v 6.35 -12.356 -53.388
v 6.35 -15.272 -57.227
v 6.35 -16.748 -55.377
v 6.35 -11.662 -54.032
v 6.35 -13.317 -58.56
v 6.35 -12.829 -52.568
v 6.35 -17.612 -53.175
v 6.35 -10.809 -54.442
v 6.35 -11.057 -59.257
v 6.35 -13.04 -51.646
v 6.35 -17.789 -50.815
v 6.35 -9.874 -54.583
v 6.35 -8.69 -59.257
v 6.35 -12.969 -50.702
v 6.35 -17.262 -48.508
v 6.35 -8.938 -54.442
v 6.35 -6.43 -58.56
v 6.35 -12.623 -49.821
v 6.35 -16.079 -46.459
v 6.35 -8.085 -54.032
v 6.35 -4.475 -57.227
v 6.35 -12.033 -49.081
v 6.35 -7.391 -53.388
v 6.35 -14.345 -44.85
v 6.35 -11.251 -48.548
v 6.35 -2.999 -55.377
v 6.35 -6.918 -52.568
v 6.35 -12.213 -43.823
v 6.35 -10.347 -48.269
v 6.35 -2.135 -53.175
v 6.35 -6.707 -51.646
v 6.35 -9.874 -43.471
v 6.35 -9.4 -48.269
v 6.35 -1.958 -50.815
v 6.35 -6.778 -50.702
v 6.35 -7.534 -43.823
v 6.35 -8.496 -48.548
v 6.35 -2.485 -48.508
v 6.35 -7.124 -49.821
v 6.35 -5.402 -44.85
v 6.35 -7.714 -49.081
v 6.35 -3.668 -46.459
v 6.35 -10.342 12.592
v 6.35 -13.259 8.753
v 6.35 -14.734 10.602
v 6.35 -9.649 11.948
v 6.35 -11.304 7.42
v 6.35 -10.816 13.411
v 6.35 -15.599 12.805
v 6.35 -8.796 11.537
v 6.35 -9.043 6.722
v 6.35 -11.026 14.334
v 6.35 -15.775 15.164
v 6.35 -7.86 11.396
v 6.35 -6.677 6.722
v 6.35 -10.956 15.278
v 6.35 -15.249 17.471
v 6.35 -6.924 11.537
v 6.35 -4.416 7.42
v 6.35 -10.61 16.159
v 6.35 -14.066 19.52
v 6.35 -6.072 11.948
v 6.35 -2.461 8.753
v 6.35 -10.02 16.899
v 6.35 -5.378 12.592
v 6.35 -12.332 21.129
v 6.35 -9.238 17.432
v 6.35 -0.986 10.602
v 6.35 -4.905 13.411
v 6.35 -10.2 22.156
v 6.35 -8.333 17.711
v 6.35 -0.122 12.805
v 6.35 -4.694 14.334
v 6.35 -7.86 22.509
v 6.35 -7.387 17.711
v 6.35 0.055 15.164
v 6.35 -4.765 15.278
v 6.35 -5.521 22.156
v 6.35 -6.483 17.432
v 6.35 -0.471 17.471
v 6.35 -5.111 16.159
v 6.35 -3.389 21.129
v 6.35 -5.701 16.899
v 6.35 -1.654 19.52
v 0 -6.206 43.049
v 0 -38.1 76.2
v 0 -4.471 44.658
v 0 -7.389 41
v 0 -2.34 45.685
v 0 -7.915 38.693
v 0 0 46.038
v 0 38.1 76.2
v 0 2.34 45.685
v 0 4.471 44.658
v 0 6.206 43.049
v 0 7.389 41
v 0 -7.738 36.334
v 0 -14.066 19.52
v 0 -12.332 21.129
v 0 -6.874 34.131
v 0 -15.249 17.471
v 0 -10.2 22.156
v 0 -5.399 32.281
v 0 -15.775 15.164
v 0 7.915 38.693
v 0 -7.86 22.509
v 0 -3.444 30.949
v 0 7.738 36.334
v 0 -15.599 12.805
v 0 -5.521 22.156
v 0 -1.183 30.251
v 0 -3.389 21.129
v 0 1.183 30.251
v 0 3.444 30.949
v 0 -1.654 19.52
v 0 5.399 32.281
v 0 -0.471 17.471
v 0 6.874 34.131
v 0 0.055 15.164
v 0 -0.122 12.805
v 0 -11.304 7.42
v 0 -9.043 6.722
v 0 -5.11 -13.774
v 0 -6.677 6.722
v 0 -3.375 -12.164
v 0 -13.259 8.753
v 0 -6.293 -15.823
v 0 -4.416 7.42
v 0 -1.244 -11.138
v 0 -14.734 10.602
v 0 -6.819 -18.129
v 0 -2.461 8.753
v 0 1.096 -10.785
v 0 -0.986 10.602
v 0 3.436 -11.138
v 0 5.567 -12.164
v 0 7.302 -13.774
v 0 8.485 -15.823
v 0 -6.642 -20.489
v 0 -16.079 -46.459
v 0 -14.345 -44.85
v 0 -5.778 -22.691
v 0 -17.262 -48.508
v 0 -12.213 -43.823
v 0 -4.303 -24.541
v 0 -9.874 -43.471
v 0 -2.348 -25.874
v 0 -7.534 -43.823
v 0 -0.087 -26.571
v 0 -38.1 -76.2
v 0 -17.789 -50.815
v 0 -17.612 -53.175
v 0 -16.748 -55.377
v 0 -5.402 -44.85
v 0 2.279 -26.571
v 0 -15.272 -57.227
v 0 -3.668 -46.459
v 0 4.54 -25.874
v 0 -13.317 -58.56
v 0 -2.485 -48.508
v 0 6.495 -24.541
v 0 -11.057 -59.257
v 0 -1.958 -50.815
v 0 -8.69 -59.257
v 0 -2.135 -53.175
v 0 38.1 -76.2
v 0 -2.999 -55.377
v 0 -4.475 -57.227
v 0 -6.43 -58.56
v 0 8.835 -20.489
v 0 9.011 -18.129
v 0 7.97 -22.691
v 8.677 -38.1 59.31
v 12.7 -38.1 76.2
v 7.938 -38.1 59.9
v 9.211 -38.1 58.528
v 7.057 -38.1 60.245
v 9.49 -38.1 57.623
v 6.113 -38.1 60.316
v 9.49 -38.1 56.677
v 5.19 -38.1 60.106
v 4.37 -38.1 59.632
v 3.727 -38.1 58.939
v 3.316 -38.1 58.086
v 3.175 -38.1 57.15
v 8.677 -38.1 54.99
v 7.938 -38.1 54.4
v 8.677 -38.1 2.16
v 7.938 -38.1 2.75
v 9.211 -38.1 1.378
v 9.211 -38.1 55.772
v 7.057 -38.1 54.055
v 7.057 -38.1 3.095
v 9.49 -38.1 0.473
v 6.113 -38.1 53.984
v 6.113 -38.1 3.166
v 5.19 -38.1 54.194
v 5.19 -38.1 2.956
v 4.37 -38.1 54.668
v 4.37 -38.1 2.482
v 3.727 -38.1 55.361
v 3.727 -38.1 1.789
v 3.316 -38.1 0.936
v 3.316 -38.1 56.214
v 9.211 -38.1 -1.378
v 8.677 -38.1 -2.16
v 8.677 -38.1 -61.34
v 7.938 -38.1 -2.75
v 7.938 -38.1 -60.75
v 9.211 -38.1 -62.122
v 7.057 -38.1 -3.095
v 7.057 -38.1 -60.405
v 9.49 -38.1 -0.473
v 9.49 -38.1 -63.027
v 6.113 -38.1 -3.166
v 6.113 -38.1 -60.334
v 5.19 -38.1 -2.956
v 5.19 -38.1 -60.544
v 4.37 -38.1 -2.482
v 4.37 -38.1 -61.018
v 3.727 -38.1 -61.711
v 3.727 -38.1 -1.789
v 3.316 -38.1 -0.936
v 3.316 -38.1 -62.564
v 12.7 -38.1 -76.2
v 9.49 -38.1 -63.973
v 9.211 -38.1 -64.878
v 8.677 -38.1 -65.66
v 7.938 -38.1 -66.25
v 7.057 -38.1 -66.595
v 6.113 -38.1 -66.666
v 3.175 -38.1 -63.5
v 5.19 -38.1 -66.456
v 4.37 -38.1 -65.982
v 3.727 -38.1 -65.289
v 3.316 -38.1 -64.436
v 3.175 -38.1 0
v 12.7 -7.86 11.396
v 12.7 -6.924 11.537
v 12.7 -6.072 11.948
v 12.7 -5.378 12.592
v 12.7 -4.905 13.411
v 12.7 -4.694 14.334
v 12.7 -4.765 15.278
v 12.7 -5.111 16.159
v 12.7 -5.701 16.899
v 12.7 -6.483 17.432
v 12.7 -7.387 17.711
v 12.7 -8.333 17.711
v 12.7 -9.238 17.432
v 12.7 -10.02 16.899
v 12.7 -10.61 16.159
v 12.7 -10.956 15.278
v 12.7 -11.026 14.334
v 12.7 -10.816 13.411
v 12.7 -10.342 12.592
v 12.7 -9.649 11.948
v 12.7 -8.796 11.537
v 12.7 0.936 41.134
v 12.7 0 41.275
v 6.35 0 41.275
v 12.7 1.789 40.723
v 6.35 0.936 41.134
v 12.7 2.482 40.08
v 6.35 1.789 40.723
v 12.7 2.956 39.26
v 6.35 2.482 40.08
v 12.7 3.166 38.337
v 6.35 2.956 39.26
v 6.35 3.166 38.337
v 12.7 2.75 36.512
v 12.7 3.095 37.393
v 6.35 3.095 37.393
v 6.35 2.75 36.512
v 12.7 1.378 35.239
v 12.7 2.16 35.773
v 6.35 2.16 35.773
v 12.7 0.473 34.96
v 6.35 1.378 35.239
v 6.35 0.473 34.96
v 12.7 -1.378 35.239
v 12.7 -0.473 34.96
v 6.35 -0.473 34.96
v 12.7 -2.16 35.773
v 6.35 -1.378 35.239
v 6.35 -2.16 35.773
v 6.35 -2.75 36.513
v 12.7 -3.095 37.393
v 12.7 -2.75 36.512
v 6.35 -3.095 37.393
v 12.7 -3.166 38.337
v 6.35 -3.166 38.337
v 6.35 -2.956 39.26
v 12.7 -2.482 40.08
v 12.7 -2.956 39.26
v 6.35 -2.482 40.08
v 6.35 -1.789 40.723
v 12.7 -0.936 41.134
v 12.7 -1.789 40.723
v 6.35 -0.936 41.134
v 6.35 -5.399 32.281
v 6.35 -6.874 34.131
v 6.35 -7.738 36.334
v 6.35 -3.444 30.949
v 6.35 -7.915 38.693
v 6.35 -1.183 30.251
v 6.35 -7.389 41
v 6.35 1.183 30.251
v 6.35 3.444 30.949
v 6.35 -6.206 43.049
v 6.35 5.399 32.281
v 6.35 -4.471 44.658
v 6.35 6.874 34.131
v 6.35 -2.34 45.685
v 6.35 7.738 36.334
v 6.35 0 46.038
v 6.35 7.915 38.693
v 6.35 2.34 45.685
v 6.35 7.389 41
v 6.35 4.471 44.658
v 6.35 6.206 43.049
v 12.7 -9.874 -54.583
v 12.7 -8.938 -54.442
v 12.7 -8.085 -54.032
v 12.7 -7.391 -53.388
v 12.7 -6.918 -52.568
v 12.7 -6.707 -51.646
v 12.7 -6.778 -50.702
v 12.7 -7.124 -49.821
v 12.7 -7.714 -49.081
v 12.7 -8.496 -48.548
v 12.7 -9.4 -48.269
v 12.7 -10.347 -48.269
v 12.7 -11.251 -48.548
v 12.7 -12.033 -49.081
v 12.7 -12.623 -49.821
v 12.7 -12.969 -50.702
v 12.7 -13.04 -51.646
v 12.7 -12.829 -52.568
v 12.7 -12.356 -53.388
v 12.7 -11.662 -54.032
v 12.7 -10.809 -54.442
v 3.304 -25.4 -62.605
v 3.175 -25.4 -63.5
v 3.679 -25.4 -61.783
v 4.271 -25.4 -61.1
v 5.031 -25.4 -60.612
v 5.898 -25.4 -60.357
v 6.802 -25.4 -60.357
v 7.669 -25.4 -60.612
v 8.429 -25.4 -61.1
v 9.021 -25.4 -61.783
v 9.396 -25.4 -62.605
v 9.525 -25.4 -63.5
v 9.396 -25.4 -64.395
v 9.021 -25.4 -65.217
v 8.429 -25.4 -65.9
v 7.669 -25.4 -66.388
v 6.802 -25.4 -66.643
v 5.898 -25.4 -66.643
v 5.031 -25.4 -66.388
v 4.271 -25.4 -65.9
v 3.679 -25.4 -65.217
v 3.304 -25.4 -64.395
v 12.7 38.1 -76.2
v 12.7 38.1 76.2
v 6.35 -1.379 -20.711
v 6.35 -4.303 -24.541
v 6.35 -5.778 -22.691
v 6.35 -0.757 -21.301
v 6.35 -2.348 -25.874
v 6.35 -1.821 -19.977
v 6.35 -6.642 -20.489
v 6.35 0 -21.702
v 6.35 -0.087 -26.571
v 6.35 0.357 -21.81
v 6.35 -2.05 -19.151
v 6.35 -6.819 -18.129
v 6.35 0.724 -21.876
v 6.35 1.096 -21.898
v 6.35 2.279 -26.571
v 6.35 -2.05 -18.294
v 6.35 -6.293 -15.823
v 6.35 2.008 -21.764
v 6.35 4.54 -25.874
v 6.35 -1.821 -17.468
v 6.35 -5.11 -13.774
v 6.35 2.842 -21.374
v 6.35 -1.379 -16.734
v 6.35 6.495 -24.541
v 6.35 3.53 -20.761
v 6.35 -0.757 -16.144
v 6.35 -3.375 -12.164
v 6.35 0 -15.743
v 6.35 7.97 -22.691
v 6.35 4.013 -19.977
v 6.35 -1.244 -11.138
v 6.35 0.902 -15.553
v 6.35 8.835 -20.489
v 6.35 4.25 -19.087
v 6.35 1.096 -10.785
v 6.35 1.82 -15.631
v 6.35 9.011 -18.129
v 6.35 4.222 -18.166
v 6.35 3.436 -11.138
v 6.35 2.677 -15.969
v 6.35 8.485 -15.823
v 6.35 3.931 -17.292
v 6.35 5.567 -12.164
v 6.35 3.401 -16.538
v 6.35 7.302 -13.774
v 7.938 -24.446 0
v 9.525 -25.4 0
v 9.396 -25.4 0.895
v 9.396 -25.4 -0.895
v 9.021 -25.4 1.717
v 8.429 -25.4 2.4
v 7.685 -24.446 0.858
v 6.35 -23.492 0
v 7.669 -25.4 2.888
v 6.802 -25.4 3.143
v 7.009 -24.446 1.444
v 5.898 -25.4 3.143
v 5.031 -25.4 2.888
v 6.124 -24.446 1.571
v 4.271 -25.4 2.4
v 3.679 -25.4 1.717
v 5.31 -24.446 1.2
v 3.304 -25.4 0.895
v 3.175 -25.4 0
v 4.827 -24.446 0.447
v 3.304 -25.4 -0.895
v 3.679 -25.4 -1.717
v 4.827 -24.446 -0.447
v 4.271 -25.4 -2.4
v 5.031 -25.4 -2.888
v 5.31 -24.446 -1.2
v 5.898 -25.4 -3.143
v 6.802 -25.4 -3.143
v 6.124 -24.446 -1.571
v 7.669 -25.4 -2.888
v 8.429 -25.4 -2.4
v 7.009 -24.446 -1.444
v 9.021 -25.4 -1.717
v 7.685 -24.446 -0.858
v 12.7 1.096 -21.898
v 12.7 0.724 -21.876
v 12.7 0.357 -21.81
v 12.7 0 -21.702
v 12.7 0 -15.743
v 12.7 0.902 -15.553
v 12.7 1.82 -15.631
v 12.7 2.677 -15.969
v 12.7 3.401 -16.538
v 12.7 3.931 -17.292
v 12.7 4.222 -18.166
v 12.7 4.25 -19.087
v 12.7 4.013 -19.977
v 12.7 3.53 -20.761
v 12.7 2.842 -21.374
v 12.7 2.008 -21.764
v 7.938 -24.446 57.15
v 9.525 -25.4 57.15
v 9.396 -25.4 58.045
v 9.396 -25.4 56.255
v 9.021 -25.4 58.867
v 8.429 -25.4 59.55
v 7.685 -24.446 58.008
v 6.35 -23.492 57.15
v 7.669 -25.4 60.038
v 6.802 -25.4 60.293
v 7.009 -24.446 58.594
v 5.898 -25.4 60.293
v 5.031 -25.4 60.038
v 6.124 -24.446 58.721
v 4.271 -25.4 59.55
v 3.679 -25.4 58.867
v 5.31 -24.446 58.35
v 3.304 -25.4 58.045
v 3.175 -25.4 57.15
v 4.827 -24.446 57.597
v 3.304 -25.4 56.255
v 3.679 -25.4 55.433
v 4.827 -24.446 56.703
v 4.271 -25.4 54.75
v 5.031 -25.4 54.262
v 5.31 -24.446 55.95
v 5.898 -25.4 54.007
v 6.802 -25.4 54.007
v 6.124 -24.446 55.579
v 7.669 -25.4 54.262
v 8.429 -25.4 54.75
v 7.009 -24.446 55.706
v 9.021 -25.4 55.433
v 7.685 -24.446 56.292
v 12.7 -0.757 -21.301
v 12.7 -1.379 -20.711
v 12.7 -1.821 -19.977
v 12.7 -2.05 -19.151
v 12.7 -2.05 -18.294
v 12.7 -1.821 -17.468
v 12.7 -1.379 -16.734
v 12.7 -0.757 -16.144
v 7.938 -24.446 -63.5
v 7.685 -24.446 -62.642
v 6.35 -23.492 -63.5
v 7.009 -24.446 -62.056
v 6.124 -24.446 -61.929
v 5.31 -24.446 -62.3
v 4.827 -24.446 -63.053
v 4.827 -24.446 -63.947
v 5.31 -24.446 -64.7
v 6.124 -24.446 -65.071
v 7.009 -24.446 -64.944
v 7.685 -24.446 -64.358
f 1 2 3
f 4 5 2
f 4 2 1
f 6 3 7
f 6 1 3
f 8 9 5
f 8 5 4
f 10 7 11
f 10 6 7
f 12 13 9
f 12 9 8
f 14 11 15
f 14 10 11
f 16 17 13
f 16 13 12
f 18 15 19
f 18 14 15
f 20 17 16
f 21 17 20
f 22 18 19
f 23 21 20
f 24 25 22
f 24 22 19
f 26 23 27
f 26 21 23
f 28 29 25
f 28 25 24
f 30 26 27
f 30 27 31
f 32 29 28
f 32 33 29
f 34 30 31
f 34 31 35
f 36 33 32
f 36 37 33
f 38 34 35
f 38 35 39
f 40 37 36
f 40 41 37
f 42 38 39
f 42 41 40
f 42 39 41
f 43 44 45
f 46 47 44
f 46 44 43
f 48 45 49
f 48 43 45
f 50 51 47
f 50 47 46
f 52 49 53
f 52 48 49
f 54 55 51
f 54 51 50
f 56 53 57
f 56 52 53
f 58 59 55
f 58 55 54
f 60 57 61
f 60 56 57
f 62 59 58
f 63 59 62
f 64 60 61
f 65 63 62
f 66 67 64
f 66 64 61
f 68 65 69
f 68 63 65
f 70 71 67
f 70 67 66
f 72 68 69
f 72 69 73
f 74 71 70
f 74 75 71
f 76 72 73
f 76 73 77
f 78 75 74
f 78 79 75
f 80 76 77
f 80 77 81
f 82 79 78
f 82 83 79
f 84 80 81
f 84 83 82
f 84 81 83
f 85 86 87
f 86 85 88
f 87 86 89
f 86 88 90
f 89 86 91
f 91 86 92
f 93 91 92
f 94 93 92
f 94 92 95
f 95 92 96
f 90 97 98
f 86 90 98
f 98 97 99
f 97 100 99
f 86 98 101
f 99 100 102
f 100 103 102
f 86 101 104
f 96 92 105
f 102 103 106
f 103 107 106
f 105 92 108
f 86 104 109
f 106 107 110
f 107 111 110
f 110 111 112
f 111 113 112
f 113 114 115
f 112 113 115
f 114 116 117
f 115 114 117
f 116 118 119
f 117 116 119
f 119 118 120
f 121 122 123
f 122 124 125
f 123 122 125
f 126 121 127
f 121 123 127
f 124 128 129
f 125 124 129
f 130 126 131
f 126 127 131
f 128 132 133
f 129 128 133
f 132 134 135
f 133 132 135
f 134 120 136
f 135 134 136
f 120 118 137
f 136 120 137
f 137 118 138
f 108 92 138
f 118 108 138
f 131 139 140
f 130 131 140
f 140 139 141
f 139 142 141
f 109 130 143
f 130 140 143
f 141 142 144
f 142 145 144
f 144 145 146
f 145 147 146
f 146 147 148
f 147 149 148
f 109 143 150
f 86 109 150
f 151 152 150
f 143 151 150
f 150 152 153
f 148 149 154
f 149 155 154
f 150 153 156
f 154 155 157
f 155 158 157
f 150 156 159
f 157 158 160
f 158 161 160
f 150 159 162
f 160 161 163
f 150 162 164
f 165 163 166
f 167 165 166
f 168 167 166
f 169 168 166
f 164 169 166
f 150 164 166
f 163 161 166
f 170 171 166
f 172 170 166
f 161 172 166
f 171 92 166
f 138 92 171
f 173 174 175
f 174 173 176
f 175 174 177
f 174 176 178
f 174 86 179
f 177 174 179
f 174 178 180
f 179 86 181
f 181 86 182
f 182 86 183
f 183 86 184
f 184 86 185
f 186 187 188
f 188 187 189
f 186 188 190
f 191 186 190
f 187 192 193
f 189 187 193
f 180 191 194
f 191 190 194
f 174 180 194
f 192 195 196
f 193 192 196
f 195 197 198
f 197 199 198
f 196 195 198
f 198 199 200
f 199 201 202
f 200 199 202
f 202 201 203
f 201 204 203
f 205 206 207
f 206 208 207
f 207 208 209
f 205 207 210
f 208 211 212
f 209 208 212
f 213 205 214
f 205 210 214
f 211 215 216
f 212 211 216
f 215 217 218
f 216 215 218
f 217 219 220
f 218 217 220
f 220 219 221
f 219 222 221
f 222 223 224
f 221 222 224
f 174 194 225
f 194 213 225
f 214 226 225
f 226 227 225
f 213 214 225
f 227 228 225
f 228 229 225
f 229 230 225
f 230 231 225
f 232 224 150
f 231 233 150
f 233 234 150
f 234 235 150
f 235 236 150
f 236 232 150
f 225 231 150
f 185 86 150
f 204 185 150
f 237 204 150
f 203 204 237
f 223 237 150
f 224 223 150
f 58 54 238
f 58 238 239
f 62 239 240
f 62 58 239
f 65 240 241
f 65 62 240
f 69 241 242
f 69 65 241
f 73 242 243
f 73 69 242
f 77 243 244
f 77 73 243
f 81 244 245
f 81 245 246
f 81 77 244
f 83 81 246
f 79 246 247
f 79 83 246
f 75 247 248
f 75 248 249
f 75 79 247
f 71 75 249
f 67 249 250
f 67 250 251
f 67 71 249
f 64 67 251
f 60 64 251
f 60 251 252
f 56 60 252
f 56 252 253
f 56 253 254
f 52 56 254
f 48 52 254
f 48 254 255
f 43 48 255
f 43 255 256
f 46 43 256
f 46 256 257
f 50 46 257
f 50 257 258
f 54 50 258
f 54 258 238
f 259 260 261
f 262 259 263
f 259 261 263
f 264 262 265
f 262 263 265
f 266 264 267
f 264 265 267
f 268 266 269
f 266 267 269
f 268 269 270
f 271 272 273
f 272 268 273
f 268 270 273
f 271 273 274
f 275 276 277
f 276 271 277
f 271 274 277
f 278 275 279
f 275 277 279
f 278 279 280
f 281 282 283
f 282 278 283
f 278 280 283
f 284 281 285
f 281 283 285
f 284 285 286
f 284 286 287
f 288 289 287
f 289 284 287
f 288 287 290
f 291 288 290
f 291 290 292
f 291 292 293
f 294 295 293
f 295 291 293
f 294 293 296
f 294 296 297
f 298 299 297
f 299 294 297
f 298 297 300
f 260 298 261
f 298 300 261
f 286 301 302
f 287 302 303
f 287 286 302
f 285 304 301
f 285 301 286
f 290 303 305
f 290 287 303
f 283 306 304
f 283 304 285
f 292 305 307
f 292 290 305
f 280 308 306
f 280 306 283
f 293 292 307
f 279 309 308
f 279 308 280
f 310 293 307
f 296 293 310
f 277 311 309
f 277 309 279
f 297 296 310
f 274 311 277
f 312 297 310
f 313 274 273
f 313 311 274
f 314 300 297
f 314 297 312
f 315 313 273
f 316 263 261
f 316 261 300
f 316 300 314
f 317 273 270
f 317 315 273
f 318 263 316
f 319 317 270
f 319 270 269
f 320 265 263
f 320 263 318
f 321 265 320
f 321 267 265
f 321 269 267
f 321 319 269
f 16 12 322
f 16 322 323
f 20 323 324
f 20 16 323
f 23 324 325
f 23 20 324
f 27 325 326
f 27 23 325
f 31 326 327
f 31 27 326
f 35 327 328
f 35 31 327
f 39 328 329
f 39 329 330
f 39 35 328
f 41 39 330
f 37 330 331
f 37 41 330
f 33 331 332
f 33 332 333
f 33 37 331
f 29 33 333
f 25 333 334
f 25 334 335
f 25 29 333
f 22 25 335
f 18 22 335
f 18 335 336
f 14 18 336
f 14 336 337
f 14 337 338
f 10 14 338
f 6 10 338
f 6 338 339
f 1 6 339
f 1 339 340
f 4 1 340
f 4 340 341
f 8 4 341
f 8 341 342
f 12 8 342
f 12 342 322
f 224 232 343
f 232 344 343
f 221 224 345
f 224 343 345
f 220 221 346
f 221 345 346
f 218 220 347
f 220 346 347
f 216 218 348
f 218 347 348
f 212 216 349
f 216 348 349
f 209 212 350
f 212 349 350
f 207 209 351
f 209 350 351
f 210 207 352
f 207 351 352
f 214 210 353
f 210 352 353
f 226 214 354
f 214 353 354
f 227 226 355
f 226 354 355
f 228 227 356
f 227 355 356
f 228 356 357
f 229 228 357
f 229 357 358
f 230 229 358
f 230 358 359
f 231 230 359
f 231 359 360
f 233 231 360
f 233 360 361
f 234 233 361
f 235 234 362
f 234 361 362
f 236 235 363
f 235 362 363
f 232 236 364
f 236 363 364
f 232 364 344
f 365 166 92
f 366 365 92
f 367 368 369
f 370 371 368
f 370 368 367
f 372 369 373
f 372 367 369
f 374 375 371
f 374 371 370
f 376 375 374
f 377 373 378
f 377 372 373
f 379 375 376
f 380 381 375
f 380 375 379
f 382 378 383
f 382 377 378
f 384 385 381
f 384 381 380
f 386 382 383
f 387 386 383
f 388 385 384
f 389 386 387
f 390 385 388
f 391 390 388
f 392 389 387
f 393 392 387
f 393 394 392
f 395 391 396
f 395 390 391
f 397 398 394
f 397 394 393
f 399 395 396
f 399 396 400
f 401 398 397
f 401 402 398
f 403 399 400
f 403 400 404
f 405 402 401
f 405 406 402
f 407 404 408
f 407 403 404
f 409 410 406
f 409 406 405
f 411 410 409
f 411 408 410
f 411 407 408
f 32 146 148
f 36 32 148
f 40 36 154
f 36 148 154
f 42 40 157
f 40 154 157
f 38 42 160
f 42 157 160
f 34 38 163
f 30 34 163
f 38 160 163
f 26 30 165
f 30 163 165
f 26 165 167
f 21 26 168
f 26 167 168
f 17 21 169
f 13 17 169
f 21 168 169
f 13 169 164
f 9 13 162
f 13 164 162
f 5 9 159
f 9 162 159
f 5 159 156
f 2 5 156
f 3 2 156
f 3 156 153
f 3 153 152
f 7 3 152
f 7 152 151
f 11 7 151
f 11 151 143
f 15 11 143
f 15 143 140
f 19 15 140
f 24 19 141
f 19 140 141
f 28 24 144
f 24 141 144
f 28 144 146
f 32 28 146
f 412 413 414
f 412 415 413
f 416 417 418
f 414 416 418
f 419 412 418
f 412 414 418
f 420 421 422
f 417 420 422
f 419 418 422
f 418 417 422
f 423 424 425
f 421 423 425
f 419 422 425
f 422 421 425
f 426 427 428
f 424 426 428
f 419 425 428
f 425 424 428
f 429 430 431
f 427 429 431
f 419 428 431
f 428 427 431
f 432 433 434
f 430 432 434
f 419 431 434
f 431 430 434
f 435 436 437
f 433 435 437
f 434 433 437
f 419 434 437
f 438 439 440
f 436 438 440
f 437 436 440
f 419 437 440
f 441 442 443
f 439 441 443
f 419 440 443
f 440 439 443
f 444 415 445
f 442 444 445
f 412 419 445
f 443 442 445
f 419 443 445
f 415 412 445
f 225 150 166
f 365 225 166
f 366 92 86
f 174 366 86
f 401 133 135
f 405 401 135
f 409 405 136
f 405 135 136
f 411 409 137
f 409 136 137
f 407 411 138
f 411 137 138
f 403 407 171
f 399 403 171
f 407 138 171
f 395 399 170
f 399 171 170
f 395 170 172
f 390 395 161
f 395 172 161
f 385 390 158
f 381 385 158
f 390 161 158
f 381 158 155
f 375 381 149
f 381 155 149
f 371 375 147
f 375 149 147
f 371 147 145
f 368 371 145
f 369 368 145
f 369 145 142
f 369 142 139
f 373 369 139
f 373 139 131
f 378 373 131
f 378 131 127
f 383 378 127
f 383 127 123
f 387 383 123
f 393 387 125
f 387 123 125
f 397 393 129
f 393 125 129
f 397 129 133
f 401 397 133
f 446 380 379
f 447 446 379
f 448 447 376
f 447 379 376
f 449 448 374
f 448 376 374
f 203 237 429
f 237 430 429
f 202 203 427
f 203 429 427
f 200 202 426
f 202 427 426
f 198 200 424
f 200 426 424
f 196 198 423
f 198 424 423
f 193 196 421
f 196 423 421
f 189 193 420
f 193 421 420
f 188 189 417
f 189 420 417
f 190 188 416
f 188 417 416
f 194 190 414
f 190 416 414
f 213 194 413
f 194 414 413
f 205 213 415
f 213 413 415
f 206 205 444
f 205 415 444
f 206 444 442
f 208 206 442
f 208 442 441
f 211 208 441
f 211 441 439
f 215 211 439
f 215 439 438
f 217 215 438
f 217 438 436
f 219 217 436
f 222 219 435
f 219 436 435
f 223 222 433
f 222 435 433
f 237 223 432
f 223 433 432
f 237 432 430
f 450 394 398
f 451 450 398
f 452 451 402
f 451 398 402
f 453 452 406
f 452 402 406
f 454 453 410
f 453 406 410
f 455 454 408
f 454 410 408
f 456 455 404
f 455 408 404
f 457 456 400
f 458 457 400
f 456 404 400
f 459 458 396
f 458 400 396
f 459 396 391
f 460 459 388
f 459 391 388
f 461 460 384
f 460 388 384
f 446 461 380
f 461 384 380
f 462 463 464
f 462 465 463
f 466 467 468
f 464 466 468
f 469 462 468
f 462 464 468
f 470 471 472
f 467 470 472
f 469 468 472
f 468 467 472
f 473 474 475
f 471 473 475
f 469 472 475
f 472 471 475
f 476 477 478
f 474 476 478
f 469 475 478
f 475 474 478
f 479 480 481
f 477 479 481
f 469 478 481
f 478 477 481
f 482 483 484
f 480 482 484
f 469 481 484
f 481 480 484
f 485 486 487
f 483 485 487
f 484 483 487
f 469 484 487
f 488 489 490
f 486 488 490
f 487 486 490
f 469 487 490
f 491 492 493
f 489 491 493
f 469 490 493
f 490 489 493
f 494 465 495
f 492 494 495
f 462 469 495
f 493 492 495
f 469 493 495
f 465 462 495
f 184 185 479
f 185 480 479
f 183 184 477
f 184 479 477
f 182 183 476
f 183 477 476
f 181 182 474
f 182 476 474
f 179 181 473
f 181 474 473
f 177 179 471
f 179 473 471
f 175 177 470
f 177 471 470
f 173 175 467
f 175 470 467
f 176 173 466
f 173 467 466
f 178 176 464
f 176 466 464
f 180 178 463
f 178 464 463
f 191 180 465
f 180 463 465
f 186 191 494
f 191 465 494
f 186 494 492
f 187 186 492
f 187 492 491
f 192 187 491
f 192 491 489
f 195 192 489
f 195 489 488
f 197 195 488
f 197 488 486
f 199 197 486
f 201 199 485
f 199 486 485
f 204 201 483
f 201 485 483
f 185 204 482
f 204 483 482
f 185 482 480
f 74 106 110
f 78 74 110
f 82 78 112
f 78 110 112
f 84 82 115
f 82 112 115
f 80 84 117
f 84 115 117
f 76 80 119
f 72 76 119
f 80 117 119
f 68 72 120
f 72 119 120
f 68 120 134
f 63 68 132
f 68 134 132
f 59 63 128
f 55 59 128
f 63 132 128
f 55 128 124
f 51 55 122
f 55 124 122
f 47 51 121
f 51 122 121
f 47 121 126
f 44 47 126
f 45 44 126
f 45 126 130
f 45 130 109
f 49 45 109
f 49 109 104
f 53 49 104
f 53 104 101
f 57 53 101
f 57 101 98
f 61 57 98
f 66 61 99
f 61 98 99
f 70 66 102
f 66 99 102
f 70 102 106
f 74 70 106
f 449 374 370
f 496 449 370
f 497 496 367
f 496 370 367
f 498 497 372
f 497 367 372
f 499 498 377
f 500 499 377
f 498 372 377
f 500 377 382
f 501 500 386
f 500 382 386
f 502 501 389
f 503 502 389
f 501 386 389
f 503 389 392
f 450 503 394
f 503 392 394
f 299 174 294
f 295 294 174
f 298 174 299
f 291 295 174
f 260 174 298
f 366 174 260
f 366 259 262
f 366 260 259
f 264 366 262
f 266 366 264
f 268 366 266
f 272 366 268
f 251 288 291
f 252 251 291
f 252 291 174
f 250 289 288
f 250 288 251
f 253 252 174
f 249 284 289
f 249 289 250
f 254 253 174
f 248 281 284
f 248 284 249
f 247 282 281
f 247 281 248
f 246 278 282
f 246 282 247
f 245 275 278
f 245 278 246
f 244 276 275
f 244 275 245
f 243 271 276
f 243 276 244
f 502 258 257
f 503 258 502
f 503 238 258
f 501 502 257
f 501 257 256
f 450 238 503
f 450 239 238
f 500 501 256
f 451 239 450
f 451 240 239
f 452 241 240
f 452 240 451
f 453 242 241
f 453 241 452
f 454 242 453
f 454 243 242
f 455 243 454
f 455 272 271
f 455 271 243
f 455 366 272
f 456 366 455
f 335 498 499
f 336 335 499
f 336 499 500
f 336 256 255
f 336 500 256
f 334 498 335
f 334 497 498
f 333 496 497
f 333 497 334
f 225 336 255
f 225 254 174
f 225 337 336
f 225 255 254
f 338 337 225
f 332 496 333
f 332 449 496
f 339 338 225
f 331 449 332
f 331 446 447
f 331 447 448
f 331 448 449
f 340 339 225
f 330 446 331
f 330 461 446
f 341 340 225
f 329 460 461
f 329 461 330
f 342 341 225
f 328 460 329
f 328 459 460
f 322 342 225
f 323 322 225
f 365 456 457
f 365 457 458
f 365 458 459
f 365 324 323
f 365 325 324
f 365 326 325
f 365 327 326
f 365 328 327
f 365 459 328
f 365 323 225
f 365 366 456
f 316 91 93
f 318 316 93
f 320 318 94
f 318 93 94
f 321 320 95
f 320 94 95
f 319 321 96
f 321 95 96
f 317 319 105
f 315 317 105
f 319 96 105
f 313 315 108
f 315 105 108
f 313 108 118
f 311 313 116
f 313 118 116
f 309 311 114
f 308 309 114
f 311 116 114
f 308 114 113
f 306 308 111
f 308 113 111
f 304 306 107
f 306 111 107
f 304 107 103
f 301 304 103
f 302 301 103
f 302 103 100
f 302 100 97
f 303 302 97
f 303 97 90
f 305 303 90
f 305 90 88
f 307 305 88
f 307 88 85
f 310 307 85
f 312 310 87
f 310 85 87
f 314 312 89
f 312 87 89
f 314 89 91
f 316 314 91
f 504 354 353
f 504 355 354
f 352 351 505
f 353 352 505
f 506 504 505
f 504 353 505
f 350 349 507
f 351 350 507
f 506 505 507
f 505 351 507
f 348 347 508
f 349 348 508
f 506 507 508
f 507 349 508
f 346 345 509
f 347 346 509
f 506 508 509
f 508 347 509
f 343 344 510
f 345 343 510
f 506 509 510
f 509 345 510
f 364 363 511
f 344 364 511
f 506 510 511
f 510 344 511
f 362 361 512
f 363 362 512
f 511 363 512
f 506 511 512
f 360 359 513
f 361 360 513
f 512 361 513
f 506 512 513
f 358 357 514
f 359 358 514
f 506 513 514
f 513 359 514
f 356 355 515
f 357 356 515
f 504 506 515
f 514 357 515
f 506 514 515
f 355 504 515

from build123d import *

# Parameters (mm, degrees)
SKETCH1_W                       = 152.4
SKETCH1_H                       = 76.2
SKETCH1_R                       = 3.175
BOSS_EXTRUDE1_DEPTH             = 12.7
SKETCH2_R                       = 7.9375
CUT_EXTRUDE1_DEPTH              = 6.35
F_1_4_0_25_DIAMETER_HOLE1_D     = 6.35
F_1_4_0_25_DIAMETER_HOLE1_DEPTH = 12.7
F_1_4_0_25_DIAMETER_HOLE1_TIP   = 1.907732465


with BuildPart() as part:
    # Sketch1 → Boss-Extrude1 (new body)
    with BuildSketch(Plane(origin=(0, 0, 0), x_dir=(0, 0, -1), z_dir=(1, 0, 0))):
        Rectangle(SKETCH1_W, SKETCH1_H)
        with Locations((18.72253158, 1.096077429)):
            Circle(SKETCH1_R, mode=Mode.SUBTRACT)
        with Locations((-38.1, 0)):
            Circle(SKETCH1_R, mode=Mode.SUBTRACT)
        with Locations((-14.571224015, -7.860160654)):
            Circle(SKETCH1_R, mode=Mode.SUBTRACT)
        with Locations((51.408255992, -9.873506971)):
            Circle(SKETCH1_R, mode=Mode.SUBTRACT)
    extrude(amount=BOSS_EXTRUDE1_DEPTH)

    # Sketch2 → Cut-Extrude1 (cut)
    with BuildSketch(Plane.ZY):
        with Locations((38.1, 0)):
            Circle(SKETCH2_R)
        with Locations((14.571224015, -7.860160654)):
            Circle(SKETCH2_R)
        with Locations((-18.72253158, 1.096077429)):
            Circle(SKETCH2_R)
        with Locations((-51.408255992, -9.873506971)):
            Circle(SKETCH2_R)
    extrude(amount=-CUT_EXTRUDE1_DEPTH, mode=Mode.SUBTRACT)

    # 1/4 (0.25) Diameter Hole1
    with Locations(Plane.XZ.offset(38.1)):
        with Locations((6.35, -63.5), (6.35, 0), (6.35, 57.15)):
            Hole(F_1_4_0_25_DIAMETER_HOLE1_D / 2, depth=F_1_4_0_25_DIAMETER_HOLE1_DEPTH)
            with Locations((0, 0, -(F_1_4_0_25_DIAMETER_HOLE1_DEPTH + F_1_4_0_25_DIAMETER_HOLE1_TIP / 2))):  # 118° drill point
                Cone(0, F_1_4_0_25_DIAMETER_HOLE1_D / 2, F_1_4_0_25_DIAMETER_HOLE1_TIP, mode=Mode.SUBTRACT)


solid = part.part
